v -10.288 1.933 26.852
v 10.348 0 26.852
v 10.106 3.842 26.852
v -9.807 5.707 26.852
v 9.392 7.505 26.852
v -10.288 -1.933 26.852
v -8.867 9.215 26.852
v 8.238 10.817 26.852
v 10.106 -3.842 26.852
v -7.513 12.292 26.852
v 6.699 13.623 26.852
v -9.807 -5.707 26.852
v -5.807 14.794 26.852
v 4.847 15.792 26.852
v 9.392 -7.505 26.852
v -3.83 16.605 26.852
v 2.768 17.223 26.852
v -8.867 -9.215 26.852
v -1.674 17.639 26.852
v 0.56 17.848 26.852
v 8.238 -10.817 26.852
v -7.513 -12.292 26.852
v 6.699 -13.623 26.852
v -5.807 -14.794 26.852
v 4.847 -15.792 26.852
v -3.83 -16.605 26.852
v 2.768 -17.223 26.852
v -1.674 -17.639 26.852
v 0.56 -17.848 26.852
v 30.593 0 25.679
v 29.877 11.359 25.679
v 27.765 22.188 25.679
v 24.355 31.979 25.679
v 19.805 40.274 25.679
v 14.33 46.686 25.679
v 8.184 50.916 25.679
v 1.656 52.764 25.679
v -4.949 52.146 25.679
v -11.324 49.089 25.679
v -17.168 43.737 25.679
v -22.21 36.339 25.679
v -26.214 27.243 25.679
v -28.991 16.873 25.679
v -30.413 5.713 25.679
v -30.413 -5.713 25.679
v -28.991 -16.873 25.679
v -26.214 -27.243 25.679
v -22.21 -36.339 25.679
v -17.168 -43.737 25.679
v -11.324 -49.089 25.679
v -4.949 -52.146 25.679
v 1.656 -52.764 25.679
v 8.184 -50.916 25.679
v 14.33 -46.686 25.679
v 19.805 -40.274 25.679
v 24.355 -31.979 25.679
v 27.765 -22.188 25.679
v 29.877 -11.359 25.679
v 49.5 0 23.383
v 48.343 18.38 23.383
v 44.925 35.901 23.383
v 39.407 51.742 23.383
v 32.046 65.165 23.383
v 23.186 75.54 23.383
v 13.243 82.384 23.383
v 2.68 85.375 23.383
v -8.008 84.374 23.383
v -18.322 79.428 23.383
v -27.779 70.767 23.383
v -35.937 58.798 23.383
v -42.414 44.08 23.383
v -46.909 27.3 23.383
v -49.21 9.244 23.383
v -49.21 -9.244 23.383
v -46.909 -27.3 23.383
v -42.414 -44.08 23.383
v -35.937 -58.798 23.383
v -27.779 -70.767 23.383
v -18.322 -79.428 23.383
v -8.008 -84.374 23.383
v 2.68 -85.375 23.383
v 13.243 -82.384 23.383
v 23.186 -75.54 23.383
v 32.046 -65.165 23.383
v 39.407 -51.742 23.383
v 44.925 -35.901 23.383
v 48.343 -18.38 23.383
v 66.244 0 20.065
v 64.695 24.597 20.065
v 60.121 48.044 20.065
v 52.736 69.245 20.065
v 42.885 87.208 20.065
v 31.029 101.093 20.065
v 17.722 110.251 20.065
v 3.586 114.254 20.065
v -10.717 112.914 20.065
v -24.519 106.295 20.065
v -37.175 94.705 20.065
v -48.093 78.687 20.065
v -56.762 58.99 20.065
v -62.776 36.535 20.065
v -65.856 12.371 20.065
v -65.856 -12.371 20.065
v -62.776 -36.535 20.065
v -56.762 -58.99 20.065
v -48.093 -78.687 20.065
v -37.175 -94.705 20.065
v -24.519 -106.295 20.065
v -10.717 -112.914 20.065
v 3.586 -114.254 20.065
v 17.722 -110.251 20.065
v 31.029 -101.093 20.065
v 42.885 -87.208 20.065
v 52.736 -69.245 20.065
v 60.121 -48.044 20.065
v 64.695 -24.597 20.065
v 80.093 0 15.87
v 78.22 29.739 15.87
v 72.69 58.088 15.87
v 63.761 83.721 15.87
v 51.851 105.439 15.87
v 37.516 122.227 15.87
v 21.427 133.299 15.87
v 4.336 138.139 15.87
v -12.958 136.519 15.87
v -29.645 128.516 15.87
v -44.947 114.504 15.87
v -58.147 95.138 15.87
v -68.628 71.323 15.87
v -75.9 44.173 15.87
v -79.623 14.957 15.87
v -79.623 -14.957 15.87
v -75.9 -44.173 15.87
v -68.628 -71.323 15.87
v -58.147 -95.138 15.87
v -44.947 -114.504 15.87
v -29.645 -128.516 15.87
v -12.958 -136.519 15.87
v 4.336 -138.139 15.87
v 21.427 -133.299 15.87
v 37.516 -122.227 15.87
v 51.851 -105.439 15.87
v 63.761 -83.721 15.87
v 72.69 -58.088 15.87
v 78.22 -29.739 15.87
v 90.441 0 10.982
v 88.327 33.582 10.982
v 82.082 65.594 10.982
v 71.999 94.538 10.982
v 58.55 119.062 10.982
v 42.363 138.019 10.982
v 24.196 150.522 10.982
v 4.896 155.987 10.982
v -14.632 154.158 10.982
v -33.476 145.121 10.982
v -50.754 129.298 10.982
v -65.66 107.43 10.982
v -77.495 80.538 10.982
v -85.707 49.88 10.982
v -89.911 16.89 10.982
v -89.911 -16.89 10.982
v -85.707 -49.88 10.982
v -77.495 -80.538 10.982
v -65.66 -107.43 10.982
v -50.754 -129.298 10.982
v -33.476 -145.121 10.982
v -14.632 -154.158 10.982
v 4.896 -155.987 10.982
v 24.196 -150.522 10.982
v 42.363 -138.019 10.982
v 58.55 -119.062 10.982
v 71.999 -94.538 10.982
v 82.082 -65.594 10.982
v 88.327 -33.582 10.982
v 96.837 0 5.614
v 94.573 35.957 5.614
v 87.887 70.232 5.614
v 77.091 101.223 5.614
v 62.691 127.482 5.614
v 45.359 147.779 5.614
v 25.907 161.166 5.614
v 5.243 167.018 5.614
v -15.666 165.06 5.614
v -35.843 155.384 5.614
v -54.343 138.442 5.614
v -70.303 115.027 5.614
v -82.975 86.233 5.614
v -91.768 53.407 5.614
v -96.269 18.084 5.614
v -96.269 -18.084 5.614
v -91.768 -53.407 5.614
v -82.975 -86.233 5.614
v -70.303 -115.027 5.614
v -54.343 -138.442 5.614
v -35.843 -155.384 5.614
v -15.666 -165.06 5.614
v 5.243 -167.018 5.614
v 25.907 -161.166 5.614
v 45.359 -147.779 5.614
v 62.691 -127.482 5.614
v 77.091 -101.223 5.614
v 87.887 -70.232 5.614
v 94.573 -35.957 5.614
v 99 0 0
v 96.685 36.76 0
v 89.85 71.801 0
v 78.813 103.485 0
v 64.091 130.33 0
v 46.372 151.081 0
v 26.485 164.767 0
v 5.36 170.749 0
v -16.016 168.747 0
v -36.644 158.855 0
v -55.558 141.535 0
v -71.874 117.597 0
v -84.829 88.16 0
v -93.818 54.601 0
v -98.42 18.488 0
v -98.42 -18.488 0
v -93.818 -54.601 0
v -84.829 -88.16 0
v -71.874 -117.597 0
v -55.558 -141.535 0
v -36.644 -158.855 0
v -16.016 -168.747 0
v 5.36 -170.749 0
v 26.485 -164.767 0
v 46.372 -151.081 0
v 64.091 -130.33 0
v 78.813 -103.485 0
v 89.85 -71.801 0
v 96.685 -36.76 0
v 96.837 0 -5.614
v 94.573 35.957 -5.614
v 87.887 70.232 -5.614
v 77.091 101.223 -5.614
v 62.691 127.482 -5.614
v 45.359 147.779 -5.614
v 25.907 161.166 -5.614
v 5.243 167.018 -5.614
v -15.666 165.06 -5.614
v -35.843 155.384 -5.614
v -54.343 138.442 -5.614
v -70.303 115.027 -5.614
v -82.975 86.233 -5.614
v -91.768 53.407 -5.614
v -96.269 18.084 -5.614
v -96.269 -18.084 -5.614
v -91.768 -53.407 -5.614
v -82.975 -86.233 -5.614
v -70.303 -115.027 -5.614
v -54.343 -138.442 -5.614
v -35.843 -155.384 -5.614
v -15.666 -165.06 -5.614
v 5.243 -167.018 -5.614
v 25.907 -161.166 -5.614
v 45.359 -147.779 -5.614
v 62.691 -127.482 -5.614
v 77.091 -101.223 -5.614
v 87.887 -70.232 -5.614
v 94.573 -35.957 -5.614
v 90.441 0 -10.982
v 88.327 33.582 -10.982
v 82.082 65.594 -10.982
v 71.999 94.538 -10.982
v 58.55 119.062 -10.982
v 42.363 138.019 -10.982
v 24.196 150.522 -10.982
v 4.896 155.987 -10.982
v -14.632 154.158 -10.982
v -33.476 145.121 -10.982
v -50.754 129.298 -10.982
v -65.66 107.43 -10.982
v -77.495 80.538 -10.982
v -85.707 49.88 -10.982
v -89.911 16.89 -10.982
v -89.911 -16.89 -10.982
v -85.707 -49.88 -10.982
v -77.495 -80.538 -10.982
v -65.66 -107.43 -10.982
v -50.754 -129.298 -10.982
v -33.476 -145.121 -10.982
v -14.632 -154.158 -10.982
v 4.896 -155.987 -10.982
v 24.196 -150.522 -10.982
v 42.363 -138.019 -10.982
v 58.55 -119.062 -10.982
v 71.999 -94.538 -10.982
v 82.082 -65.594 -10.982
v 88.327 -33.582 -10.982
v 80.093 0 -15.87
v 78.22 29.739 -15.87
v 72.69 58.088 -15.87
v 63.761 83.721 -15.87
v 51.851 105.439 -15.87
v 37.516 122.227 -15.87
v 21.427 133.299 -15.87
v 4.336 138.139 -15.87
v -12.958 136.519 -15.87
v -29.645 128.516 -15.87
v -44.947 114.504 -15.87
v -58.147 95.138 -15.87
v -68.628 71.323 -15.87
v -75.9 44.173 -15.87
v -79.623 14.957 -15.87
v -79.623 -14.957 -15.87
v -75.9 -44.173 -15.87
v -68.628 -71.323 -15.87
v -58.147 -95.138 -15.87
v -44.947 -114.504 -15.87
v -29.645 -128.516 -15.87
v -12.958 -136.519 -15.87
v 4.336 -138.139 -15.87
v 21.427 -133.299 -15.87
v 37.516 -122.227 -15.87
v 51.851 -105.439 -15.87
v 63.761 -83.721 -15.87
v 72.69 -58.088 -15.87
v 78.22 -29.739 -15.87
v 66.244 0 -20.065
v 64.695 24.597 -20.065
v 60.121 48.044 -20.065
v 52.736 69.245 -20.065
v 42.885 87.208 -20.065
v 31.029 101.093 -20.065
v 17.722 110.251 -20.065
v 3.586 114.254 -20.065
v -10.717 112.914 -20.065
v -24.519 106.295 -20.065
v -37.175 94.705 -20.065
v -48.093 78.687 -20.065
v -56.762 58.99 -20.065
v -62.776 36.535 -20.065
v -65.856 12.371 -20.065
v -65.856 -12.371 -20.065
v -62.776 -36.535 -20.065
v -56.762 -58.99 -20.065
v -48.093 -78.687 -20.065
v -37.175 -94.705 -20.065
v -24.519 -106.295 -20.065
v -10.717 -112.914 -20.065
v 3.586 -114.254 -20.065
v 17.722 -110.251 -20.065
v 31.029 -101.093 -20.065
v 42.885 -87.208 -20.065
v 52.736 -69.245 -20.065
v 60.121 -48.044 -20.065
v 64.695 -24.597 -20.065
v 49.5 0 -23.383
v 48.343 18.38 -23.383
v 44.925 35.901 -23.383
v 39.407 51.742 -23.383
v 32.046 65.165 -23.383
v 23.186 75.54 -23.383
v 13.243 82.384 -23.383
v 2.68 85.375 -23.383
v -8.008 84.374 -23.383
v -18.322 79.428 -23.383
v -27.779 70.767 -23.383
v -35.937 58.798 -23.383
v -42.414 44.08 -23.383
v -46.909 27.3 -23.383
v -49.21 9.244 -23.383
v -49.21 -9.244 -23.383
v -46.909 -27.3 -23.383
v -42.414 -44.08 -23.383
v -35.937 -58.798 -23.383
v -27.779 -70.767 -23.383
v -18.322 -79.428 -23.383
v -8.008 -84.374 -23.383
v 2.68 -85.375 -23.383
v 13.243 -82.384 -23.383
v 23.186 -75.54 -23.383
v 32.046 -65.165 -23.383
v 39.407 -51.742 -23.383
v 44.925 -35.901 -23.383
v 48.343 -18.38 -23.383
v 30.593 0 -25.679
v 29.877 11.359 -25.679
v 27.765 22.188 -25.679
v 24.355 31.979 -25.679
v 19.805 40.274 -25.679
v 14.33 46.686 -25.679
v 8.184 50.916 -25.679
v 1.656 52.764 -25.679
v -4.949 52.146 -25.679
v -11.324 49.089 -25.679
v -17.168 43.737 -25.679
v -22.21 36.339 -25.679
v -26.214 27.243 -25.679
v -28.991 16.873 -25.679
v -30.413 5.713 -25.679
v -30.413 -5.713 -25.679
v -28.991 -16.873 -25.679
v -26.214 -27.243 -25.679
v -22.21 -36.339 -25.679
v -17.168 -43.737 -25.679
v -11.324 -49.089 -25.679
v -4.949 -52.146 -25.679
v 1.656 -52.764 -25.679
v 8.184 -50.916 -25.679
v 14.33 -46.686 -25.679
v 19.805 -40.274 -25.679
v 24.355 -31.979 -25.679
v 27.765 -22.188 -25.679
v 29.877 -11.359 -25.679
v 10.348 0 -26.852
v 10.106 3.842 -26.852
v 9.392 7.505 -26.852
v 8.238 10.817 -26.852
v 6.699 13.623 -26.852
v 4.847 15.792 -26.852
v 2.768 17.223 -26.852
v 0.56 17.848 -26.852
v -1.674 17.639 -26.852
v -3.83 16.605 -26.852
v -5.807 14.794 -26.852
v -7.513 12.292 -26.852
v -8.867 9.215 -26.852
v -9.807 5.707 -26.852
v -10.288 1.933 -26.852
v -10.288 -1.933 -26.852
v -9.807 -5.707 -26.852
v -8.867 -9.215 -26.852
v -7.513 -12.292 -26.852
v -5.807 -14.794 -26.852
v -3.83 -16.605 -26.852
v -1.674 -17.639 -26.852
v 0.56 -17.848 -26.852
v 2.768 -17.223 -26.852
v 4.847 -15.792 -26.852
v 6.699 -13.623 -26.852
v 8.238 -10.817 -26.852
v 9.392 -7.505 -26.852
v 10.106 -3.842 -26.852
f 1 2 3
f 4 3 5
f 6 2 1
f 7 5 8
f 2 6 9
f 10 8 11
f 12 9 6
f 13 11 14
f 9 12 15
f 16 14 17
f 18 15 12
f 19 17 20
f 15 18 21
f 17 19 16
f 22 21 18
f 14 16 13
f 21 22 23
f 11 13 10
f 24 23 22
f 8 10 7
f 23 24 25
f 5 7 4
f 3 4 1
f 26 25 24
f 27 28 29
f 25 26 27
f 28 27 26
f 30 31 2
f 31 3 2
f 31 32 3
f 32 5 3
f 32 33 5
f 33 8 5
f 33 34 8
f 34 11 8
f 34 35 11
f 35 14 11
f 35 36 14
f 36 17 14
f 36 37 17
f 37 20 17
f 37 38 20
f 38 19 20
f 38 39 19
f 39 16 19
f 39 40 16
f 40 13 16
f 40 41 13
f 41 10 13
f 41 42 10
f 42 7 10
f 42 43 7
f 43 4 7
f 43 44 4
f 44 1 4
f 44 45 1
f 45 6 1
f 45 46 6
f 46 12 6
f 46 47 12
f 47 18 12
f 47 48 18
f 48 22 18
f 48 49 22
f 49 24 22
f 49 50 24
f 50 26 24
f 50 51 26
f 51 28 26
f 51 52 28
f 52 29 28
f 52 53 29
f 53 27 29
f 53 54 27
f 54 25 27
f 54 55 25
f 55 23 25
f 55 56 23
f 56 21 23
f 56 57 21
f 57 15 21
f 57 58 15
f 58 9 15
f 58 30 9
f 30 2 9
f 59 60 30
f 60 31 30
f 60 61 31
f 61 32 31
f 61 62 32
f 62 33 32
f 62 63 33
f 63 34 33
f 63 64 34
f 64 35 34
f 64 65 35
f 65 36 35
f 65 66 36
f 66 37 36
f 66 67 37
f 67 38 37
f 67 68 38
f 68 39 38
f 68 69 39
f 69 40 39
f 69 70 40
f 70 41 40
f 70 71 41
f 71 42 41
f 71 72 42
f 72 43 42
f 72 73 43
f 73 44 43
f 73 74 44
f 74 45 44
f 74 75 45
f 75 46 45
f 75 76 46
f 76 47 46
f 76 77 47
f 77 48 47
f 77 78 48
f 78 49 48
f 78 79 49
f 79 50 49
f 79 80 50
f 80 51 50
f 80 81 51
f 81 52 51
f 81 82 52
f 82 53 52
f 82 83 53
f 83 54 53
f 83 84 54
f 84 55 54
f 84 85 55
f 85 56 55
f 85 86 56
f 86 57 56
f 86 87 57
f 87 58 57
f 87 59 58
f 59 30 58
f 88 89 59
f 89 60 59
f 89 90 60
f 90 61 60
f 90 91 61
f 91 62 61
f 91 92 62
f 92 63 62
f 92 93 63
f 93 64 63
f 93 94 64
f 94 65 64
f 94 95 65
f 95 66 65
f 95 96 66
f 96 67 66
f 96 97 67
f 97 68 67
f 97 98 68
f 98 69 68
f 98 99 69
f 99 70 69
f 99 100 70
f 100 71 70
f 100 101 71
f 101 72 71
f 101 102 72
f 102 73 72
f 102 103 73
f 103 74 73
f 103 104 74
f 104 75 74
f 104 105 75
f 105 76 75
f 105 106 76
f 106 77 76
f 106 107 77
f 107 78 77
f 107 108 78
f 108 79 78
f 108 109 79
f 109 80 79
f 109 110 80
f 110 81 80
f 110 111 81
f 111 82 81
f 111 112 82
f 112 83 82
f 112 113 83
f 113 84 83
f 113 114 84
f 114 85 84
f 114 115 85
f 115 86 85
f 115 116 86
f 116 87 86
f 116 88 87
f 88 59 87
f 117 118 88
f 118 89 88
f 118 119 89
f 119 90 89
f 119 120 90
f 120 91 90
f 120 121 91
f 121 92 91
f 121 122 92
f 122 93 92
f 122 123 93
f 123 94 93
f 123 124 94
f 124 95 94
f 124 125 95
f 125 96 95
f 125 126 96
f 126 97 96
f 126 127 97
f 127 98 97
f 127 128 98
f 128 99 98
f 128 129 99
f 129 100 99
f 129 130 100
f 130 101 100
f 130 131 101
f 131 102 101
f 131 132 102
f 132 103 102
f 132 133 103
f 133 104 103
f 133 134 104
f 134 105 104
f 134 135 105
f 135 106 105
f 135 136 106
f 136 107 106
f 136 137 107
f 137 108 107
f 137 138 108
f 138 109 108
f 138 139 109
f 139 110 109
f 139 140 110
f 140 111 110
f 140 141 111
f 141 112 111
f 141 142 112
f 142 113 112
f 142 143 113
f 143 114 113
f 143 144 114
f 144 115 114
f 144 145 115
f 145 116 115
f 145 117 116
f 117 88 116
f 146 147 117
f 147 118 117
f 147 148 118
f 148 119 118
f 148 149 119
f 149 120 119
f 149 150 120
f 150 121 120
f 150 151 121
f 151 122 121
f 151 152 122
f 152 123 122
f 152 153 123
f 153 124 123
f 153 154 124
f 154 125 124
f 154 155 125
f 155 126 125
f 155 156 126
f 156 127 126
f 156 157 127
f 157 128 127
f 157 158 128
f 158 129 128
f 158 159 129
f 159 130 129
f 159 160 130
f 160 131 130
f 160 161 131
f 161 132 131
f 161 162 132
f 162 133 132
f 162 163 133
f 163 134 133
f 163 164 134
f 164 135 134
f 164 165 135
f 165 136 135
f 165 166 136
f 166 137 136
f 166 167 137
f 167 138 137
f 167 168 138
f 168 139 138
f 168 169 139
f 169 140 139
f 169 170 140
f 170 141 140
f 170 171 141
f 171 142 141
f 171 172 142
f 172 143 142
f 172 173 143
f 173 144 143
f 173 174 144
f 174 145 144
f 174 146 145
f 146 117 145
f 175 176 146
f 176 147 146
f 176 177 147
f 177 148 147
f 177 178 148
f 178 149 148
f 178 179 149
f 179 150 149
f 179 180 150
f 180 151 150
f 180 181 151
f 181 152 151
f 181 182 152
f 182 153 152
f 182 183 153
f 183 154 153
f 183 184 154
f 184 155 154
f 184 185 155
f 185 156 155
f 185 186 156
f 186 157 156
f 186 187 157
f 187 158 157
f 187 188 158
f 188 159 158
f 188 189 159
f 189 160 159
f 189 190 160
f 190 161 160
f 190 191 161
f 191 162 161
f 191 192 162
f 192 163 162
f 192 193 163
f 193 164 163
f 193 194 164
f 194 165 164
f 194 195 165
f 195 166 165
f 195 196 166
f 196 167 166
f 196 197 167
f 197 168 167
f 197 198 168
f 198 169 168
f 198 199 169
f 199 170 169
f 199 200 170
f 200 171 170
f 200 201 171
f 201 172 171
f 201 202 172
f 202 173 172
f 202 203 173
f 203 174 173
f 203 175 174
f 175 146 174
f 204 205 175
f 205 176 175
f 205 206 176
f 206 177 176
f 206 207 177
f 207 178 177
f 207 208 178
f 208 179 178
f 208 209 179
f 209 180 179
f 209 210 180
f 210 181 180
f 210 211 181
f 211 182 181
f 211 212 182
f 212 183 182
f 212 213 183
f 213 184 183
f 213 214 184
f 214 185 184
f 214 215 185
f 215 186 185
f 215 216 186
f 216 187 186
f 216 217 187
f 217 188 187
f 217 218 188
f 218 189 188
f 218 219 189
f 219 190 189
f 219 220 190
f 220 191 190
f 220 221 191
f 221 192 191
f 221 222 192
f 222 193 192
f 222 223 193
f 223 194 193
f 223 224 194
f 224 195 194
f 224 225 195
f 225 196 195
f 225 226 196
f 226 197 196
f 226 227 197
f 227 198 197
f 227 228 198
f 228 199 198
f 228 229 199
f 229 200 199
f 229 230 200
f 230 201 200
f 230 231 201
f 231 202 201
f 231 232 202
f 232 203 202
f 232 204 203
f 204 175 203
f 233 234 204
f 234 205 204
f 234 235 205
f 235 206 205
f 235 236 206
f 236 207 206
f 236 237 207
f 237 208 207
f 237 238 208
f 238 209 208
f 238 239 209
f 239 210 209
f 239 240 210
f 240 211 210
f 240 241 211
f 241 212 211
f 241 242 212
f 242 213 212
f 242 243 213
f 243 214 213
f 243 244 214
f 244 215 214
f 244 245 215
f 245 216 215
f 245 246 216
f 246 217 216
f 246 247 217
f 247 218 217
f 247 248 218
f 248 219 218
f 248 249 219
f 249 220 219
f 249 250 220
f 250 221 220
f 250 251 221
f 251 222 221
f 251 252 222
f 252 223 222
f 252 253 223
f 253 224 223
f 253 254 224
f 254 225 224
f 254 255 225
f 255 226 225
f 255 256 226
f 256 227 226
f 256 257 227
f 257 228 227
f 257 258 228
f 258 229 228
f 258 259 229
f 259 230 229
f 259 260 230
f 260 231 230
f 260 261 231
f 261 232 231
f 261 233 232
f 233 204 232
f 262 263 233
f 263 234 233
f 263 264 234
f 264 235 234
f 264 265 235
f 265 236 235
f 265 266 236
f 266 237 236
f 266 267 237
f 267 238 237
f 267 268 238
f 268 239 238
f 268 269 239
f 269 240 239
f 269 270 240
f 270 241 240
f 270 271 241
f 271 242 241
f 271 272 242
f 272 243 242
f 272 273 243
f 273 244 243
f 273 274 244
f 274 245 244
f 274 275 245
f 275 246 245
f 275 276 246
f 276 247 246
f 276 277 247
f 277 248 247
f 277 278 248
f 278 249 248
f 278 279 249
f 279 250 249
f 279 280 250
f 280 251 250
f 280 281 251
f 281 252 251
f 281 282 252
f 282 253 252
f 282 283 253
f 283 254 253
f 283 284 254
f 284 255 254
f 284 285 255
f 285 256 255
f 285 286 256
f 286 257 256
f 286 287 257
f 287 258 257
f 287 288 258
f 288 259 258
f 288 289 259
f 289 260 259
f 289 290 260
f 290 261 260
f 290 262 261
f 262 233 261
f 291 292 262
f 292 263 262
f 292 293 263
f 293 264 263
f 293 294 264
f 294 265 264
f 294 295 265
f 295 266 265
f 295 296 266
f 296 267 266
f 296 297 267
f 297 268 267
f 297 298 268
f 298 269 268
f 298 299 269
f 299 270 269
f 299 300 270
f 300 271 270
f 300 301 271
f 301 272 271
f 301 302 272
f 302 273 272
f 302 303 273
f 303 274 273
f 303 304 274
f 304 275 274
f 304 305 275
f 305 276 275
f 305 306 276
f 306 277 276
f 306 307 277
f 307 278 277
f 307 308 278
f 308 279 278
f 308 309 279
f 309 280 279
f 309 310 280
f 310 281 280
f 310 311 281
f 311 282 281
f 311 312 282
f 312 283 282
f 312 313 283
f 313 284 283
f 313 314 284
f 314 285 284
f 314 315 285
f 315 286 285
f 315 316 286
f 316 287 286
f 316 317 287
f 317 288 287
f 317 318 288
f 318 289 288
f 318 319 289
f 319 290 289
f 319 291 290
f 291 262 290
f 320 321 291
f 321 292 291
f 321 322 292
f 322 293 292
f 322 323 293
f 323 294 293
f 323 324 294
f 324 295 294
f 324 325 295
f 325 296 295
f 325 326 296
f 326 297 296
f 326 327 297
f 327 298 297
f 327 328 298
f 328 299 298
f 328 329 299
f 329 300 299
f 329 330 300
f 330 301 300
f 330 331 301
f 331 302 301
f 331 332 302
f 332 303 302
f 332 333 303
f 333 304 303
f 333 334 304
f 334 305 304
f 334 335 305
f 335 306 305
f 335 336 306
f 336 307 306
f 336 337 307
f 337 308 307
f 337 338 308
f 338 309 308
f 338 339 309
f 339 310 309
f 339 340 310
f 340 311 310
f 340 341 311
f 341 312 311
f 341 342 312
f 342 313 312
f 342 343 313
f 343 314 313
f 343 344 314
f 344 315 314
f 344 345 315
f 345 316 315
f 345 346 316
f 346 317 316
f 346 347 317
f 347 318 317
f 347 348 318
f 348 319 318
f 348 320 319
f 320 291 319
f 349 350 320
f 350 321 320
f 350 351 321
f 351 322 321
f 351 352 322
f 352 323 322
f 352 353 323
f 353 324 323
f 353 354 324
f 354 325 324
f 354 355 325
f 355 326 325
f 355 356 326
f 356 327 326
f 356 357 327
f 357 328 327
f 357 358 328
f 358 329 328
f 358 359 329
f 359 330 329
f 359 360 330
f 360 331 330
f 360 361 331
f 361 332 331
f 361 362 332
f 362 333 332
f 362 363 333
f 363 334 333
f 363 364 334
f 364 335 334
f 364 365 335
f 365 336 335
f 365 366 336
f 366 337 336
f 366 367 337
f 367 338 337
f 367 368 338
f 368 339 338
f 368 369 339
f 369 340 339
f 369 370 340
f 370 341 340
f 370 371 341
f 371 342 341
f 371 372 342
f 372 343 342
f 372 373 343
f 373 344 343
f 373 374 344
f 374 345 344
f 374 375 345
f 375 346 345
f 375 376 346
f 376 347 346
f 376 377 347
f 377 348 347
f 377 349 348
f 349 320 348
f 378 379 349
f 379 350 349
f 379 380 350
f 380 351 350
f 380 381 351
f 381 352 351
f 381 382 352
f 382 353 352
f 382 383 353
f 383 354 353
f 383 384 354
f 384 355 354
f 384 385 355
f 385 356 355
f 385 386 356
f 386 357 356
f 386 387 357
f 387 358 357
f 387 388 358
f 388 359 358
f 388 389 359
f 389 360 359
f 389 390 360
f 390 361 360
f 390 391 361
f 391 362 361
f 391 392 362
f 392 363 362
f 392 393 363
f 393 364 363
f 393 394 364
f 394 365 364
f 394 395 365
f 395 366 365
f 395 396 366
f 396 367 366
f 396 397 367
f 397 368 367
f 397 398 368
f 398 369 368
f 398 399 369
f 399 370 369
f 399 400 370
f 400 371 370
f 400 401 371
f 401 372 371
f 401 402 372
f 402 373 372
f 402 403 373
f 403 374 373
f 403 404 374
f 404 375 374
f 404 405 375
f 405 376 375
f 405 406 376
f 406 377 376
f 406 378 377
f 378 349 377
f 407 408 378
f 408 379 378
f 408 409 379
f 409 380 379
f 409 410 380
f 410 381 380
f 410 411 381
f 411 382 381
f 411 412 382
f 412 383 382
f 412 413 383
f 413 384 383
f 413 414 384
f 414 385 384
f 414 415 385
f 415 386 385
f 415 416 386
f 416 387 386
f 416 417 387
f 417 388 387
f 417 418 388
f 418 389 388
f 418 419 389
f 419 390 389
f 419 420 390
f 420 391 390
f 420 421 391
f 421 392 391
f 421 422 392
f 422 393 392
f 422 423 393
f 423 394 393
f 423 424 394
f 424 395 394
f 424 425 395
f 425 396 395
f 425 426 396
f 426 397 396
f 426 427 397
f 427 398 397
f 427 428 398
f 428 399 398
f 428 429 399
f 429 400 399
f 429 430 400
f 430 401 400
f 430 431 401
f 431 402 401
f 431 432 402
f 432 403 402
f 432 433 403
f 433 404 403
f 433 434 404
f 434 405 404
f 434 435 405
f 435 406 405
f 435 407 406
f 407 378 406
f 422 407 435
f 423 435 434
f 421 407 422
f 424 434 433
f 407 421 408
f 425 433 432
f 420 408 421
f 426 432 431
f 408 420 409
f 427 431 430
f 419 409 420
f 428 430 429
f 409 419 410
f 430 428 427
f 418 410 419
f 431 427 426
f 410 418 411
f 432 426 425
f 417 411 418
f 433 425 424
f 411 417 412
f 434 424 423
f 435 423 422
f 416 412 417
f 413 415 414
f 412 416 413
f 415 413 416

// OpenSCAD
// Generated by SolidPython 1.0.1 on 2020-07-29 00:46:50


scale(v = [11, 19, 3]) {
	sphere(r = 9);
}
/***********************************************
*********      SolidPython code:      **********
************************************************
 
# import packages: SolidPython
from solid import *
from solid.utils import *
from itertools import chain, combinations, permutations


class Resize:

    def __init__(self, scad_file):
        self.scad_file = scad_file
        #self.scad_file = import_scad(scad_file)
        # cone/cylinder param:
        self.r1 = 0
        self.r2 = 0
        self.h = 0
        # rectangular prism param:
        self.w = 0
        self.l = 0
        # ellipse param:
        self.r = 0

    # import OpenScad code (file name corresponds to shape)


    # classify shape + parameters
    def assign(self, param1, param2, param3):
        if self.scad_file == 'cone.scad':
            self.r1 = param1
            self.r2 = param2
            self.h = param3
        elif self.scad_file == 'cylinder.scad':
            self.r1 = param1
            self.r2 = param2
            self.h = param3
        elif self.scad_file == 'rectangularPrism.scad':
            self.h = param1
            self.l = param2
            self.w = param3
        else:
            self.r = param1
            self.h = param2

    # resize parameters
    def iterate(self):
        x = range(3, 20, 2)
        i = 1
        if self.scad_file == 'cone.scad':
            tempList = list(permutations(x, 2))
            for temp in tempList:
                param1 = temp[0]
                param2 = temp[1]
                filepath = 'produced_scad_files/' + 'cone' + str(param1) + '_' + str(param2) + '_' + '.scad'
                scad_render_to_file(cylinder(h=param1, r1=param2, r2=0), filepath)

        elif self.scad_file == 'cylinder.scad':
            tempList = list(permutations(x, 3))
            for temp in tempList:
                param1 = temp[0]
                param2 = temp[1]
                filepath = 'produced_scad_files/' + 'cylinder' + str(param1) + '_' + str(param2) + '_' + '.scad'
                scad_render_to_file(cylinder(h=param1, r1=param2, r2=param2), filepath)

        elif self.scad_file == 'rectangularPrism.scad':
            tempList = list(permutations(x, 3))
            for temp in tempList:
                param1 = temp[0]
                param2 = temp[1]
                param3 = temp[2]
                filepath = 'produced_scad_files/' + 'rectangularPrism' + str(param1) + '_' + str(param2) + '_' + str(
                    param3) + '.scad'
                scad_render_to_file(cube(size=(param1, param2, param3)), filepath)

        elif self.scad_file == 'ellipse.scad':
            tempList = list(permutations(x, 4))
            for temp in tempList:
                param1 = temp[0]
                param2 = temp[1]
                param3 = temp[2]
                param4 = temp[3]
                filepath = 'produced_scad_files/' + 'ellipse' + str(param1) + '_' + str(param2) + '_' + str(param3) + '_' + str(param4) + '.scad'
                scad_render_to_file(scale([param1, param2, param3])(sphere(r=param4)), filepath)

    def render_to_scadfile(self):
        scad_render_to_file(scad, 'example.scad') 
 
************************************************/
